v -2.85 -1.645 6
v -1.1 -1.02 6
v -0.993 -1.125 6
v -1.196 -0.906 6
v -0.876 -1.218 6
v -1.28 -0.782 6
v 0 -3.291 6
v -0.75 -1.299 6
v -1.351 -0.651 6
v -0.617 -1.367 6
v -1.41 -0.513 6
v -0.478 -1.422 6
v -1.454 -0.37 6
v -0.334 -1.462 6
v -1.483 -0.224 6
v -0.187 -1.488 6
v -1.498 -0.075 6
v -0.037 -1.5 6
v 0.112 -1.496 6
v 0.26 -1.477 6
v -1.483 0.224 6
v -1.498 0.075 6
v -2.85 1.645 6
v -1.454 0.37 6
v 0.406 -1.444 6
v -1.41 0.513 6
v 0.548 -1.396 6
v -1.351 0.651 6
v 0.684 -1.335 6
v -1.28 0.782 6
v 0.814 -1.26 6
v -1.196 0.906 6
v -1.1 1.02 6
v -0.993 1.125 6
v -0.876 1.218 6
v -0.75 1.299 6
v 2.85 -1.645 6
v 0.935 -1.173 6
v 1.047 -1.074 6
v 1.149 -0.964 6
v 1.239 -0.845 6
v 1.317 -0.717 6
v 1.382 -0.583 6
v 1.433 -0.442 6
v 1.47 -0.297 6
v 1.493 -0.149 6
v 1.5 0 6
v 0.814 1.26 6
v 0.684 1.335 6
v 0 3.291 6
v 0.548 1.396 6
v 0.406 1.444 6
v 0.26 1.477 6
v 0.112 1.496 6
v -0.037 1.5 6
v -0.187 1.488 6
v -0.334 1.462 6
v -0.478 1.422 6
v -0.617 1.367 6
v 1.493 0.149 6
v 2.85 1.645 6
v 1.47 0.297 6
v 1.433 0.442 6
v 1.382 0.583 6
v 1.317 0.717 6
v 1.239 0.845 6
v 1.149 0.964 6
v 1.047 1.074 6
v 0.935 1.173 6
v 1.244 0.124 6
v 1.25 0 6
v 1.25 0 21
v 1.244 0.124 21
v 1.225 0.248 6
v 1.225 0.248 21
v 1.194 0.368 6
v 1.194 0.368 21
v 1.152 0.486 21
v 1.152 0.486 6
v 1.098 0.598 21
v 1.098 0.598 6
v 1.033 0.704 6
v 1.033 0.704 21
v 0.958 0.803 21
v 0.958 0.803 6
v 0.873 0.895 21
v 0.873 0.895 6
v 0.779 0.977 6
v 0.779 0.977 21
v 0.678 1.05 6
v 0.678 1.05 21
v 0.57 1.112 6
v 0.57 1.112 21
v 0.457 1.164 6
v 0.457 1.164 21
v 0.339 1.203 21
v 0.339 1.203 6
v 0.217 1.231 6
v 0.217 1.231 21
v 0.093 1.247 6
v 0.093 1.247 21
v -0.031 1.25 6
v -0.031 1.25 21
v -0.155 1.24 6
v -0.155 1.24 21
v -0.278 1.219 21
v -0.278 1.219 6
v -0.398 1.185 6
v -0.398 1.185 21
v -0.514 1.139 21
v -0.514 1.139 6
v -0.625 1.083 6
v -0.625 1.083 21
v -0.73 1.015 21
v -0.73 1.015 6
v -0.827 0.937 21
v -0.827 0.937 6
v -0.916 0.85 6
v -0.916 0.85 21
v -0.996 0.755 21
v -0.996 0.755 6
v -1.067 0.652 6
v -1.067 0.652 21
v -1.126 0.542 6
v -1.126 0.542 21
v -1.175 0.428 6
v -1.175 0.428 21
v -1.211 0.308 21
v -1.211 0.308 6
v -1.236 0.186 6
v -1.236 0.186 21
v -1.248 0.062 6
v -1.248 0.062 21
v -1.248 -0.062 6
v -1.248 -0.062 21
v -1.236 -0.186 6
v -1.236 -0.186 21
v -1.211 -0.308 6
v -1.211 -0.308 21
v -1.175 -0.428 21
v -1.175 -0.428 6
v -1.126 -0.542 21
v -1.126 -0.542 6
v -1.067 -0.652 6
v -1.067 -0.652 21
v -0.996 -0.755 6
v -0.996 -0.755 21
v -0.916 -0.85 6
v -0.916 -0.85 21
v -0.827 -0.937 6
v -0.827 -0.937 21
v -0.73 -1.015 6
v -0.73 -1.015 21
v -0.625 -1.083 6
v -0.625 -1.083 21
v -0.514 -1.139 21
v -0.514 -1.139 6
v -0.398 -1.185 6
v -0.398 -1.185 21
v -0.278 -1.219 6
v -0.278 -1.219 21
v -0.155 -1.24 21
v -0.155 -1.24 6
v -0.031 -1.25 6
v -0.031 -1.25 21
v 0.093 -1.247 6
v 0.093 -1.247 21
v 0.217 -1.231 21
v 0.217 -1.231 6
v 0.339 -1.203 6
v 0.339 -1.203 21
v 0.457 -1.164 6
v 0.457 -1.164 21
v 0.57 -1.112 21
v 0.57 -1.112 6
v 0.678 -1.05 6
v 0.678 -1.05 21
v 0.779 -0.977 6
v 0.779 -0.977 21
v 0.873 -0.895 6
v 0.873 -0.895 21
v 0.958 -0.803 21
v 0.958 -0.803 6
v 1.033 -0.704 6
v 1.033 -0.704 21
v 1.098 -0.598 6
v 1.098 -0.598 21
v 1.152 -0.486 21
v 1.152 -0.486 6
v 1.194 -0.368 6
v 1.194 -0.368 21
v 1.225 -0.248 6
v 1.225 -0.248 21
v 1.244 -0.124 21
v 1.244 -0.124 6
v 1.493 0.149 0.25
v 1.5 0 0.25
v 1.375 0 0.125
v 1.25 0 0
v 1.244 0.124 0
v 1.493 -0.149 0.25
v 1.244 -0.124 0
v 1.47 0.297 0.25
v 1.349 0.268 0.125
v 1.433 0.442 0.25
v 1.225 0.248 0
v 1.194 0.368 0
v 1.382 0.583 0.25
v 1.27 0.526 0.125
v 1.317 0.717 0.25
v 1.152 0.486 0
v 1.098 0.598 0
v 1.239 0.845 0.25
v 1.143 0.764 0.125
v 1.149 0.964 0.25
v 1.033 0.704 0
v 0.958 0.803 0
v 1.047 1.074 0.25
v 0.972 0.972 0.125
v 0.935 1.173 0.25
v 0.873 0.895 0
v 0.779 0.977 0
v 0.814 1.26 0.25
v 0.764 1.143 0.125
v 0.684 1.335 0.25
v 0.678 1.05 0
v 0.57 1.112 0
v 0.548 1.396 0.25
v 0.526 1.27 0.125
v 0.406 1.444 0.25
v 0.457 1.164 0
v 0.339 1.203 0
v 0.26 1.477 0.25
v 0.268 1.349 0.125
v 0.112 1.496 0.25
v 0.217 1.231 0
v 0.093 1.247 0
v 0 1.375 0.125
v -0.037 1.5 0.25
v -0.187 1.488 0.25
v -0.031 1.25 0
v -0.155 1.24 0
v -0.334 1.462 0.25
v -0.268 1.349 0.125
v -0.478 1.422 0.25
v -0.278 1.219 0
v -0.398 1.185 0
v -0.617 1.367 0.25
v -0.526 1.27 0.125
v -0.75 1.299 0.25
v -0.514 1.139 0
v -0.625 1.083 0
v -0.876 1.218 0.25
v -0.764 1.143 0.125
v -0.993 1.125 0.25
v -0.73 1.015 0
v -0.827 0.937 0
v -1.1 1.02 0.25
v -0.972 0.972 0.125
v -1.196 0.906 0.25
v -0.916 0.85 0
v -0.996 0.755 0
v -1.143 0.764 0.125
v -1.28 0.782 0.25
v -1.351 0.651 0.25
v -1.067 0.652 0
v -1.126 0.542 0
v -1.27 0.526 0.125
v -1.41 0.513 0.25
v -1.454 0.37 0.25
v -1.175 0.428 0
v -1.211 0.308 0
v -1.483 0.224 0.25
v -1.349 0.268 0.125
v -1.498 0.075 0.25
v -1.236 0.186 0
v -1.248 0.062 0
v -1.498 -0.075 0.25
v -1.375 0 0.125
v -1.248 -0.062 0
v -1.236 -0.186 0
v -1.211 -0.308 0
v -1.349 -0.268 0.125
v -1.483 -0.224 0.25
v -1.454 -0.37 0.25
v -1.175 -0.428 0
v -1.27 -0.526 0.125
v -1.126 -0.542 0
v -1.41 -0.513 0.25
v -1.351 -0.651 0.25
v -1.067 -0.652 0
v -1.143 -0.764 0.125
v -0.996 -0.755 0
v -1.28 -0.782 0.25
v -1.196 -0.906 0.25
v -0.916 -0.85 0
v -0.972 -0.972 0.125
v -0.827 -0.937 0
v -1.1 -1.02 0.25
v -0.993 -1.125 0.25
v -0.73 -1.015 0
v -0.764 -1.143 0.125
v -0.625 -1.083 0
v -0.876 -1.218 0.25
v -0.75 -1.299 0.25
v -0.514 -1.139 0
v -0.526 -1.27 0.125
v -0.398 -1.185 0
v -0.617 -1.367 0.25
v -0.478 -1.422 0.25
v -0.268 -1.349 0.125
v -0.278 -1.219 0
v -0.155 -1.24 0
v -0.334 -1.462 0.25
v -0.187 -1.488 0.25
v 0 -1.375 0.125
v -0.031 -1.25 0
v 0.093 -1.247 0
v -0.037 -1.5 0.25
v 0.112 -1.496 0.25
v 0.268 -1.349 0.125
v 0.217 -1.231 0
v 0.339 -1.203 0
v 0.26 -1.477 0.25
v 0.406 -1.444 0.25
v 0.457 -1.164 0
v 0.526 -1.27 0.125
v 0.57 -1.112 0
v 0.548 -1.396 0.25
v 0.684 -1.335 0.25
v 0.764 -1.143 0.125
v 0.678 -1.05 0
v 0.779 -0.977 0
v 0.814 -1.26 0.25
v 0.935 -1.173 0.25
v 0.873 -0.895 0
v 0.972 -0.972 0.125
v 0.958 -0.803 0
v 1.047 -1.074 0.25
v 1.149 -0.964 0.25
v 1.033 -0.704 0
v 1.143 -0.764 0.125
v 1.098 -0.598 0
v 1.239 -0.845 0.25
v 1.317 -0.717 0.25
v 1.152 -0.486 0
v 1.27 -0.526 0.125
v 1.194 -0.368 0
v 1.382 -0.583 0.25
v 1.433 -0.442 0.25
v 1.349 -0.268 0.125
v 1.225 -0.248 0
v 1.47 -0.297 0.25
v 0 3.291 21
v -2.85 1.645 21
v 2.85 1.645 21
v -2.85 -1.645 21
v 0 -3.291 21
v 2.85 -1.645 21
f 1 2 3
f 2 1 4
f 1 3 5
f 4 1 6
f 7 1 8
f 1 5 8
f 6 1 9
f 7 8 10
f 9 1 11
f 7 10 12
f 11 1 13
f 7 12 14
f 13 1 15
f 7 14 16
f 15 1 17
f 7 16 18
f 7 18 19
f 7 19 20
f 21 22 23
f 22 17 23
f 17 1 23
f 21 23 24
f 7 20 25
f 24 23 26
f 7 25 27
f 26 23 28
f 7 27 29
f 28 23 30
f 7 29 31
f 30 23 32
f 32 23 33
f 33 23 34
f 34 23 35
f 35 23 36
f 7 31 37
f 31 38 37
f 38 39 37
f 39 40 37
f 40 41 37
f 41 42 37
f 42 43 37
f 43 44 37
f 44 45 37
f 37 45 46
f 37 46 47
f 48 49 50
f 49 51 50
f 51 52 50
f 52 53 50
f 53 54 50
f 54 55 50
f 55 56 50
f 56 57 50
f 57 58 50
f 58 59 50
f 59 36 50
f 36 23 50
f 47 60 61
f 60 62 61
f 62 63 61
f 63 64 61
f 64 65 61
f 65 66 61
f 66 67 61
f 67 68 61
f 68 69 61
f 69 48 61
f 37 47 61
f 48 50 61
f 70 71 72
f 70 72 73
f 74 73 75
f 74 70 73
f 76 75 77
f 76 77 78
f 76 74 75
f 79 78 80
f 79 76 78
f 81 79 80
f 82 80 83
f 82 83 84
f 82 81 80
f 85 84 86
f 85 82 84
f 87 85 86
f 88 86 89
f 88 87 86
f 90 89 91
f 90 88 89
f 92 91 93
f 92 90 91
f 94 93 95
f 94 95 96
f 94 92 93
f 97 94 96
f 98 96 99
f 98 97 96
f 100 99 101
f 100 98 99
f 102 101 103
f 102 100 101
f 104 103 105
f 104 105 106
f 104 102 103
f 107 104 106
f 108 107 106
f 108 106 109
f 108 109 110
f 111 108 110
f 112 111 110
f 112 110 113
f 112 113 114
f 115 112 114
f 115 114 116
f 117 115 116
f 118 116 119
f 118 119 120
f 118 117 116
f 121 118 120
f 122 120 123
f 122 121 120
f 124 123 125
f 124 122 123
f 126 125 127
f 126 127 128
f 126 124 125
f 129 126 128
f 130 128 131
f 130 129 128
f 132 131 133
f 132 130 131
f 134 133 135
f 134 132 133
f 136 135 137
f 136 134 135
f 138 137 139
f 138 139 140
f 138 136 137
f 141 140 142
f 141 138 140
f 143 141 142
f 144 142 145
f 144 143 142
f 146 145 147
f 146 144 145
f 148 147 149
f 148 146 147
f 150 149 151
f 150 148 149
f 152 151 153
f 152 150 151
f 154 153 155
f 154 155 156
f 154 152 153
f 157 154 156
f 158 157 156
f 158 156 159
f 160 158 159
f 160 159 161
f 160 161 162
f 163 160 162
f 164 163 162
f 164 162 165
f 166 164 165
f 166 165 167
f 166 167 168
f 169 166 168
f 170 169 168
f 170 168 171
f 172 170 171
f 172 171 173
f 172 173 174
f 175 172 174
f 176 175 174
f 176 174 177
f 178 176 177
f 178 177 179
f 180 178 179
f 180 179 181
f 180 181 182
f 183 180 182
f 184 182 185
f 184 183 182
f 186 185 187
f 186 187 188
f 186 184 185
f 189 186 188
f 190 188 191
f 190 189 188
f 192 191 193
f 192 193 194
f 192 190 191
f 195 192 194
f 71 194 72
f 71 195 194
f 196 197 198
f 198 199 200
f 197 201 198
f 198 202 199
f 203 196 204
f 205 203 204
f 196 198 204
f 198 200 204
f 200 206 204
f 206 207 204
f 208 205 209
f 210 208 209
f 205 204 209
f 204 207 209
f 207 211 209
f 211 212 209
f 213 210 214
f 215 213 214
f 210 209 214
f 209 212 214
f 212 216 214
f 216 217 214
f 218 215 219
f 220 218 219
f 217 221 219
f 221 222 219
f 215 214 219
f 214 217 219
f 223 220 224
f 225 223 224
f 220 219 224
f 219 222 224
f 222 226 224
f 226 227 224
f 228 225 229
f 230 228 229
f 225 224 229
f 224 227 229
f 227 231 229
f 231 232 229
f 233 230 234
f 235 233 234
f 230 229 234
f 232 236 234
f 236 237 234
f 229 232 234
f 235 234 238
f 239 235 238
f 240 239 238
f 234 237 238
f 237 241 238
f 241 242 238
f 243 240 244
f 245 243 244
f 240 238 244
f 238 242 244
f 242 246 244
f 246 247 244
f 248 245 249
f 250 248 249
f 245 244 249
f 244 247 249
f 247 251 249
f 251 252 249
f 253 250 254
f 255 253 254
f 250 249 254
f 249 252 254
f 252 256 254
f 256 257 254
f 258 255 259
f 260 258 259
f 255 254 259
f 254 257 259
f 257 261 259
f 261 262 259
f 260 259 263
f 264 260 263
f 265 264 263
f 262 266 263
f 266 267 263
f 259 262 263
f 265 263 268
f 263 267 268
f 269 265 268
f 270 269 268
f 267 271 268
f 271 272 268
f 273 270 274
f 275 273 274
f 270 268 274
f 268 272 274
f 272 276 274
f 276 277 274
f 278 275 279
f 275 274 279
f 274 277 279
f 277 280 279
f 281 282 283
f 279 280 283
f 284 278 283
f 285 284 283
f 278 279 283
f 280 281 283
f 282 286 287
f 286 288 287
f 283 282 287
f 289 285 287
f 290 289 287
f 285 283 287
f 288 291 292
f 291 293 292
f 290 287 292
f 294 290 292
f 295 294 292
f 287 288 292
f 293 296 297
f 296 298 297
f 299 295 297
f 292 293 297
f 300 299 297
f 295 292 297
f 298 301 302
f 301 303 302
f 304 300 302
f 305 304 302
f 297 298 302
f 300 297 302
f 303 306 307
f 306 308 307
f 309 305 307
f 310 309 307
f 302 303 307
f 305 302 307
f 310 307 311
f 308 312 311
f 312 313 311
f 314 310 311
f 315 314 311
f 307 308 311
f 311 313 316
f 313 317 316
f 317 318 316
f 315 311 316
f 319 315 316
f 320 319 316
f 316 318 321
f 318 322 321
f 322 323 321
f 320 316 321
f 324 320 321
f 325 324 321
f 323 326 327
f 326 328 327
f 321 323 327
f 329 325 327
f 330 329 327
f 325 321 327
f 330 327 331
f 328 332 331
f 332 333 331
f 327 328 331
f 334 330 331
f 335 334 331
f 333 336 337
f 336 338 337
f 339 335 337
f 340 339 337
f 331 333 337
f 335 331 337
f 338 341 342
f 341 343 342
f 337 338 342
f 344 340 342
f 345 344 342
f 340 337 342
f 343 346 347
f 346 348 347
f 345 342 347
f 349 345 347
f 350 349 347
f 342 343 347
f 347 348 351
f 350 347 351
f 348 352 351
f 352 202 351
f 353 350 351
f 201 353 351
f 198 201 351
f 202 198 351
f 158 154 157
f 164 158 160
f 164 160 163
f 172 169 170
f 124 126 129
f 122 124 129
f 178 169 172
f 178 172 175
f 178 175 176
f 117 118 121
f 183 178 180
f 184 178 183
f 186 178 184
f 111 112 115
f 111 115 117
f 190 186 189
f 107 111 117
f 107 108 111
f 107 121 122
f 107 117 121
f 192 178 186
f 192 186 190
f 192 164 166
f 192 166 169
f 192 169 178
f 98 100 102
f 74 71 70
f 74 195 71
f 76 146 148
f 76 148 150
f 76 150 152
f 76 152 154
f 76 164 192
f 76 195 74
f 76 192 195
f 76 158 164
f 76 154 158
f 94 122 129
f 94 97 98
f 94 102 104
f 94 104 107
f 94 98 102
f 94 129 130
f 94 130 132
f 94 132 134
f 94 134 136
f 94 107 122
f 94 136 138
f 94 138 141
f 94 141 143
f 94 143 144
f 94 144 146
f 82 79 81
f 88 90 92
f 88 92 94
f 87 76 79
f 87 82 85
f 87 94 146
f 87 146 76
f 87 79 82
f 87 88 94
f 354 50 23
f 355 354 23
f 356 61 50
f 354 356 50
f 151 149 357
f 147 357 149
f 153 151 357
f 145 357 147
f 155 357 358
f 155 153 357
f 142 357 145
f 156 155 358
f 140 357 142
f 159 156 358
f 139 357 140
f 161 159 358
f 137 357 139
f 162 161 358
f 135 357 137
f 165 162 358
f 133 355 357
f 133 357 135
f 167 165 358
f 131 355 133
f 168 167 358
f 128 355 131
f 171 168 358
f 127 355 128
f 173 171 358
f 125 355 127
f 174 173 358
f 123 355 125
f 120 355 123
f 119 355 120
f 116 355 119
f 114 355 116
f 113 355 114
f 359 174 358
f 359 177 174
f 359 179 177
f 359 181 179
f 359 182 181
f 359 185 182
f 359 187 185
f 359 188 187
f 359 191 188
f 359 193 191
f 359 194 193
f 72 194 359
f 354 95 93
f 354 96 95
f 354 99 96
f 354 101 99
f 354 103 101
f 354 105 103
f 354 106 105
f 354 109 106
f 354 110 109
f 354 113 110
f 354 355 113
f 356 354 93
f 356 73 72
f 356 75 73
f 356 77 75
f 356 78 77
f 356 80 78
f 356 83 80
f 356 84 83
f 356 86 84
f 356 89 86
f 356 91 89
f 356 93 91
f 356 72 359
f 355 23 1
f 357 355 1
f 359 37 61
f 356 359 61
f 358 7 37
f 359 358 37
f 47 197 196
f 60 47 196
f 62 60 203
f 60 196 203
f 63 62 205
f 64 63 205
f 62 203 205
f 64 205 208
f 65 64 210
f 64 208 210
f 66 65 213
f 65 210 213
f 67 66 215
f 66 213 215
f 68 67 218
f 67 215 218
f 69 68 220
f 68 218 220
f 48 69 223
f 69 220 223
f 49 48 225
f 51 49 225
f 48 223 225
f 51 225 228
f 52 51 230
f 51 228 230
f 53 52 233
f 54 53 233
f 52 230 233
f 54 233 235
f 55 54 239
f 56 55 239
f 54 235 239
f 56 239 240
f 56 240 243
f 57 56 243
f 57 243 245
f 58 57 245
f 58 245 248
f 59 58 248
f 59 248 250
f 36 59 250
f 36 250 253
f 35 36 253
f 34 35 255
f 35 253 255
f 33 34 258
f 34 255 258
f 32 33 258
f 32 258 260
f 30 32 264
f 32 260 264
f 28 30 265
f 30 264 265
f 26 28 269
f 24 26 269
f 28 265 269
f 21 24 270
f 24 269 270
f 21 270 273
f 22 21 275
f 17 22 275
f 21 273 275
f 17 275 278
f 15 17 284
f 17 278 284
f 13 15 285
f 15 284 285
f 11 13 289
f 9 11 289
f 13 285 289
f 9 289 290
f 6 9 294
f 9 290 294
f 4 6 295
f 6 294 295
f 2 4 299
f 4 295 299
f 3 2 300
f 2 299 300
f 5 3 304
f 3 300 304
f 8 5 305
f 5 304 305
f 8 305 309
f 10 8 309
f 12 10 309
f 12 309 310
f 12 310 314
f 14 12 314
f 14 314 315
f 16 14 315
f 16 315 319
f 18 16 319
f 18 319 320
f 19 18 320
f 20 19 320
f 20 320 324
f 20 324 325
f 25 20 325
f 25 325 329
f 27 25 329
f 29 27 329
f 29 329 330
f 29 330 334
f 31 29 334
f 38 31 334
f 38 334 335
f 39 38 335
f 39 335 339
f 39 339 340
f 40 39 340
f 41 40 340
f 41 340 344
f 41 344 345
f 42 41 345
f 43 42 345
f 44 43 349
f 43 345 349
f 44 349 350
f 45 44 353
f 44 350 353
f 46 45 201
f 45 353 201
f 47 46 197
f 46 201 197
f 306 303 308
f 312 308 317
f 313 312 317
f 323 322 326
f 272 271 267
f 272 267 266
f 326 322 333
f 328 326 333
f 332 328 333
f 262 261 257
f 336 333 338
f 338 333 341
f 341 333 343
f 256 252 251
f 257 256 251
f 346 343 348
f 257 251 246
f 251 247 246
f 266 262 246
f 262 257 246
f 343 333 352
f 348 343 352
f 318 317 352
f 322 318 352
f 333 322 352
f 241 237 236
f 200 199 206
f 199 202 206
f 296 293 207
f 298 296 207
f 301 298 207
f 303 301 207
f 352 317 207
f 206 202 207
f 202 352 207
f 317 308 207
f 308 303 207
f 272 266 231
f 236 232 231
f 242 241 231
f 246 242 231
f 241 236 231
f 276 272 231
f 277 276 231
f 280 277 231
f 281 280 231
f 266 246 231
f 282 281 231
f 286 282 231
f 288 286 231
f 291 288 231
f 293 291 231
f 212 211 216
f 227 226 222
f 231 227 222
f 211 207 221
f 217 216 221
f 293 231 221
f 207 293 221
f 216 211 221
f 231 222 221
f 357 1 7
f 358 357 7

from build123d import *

# Parameters (mm, degrees)
SKETCH_R     = 1.5
PAD_DEPTH    = 6
SKETCH001_R  = 1.25
PAD001_DEPTH = 15
CHAMFER_SIZE = 0.25


with BuildPart() as part:
    # Sketch → Pad (new body)
    with BuildSketch(Plane.XY):
        Circle(SKETCH_R)
    extrude(amount=PAD_DEPTH)

    # Sketch001 (on Face3 of Pad) → Pad001 (join)
    with BuildSketch(Plane.XY.offset(6)):
        Polygon((0, -3.290897), (2.85, -1.645448), (2.85, 1.645448), (0, 3.290897), (-2.85, 1.645448), (-2.85, -1.645448), align=None)
        Circle(SKETCH001_R, mode=Mode.SUBTRACT)
    extrude(amount=PAD001_DEPTH)

    # Chamfer
    chamfer_edges = [part.edges().sort_by_distance(p)[0] for p in [
        (-1.5, 0, 0),
    ]]
    chamfer(chamfer_edges, length=CHAMFER_SIZE)


solid = part.part
